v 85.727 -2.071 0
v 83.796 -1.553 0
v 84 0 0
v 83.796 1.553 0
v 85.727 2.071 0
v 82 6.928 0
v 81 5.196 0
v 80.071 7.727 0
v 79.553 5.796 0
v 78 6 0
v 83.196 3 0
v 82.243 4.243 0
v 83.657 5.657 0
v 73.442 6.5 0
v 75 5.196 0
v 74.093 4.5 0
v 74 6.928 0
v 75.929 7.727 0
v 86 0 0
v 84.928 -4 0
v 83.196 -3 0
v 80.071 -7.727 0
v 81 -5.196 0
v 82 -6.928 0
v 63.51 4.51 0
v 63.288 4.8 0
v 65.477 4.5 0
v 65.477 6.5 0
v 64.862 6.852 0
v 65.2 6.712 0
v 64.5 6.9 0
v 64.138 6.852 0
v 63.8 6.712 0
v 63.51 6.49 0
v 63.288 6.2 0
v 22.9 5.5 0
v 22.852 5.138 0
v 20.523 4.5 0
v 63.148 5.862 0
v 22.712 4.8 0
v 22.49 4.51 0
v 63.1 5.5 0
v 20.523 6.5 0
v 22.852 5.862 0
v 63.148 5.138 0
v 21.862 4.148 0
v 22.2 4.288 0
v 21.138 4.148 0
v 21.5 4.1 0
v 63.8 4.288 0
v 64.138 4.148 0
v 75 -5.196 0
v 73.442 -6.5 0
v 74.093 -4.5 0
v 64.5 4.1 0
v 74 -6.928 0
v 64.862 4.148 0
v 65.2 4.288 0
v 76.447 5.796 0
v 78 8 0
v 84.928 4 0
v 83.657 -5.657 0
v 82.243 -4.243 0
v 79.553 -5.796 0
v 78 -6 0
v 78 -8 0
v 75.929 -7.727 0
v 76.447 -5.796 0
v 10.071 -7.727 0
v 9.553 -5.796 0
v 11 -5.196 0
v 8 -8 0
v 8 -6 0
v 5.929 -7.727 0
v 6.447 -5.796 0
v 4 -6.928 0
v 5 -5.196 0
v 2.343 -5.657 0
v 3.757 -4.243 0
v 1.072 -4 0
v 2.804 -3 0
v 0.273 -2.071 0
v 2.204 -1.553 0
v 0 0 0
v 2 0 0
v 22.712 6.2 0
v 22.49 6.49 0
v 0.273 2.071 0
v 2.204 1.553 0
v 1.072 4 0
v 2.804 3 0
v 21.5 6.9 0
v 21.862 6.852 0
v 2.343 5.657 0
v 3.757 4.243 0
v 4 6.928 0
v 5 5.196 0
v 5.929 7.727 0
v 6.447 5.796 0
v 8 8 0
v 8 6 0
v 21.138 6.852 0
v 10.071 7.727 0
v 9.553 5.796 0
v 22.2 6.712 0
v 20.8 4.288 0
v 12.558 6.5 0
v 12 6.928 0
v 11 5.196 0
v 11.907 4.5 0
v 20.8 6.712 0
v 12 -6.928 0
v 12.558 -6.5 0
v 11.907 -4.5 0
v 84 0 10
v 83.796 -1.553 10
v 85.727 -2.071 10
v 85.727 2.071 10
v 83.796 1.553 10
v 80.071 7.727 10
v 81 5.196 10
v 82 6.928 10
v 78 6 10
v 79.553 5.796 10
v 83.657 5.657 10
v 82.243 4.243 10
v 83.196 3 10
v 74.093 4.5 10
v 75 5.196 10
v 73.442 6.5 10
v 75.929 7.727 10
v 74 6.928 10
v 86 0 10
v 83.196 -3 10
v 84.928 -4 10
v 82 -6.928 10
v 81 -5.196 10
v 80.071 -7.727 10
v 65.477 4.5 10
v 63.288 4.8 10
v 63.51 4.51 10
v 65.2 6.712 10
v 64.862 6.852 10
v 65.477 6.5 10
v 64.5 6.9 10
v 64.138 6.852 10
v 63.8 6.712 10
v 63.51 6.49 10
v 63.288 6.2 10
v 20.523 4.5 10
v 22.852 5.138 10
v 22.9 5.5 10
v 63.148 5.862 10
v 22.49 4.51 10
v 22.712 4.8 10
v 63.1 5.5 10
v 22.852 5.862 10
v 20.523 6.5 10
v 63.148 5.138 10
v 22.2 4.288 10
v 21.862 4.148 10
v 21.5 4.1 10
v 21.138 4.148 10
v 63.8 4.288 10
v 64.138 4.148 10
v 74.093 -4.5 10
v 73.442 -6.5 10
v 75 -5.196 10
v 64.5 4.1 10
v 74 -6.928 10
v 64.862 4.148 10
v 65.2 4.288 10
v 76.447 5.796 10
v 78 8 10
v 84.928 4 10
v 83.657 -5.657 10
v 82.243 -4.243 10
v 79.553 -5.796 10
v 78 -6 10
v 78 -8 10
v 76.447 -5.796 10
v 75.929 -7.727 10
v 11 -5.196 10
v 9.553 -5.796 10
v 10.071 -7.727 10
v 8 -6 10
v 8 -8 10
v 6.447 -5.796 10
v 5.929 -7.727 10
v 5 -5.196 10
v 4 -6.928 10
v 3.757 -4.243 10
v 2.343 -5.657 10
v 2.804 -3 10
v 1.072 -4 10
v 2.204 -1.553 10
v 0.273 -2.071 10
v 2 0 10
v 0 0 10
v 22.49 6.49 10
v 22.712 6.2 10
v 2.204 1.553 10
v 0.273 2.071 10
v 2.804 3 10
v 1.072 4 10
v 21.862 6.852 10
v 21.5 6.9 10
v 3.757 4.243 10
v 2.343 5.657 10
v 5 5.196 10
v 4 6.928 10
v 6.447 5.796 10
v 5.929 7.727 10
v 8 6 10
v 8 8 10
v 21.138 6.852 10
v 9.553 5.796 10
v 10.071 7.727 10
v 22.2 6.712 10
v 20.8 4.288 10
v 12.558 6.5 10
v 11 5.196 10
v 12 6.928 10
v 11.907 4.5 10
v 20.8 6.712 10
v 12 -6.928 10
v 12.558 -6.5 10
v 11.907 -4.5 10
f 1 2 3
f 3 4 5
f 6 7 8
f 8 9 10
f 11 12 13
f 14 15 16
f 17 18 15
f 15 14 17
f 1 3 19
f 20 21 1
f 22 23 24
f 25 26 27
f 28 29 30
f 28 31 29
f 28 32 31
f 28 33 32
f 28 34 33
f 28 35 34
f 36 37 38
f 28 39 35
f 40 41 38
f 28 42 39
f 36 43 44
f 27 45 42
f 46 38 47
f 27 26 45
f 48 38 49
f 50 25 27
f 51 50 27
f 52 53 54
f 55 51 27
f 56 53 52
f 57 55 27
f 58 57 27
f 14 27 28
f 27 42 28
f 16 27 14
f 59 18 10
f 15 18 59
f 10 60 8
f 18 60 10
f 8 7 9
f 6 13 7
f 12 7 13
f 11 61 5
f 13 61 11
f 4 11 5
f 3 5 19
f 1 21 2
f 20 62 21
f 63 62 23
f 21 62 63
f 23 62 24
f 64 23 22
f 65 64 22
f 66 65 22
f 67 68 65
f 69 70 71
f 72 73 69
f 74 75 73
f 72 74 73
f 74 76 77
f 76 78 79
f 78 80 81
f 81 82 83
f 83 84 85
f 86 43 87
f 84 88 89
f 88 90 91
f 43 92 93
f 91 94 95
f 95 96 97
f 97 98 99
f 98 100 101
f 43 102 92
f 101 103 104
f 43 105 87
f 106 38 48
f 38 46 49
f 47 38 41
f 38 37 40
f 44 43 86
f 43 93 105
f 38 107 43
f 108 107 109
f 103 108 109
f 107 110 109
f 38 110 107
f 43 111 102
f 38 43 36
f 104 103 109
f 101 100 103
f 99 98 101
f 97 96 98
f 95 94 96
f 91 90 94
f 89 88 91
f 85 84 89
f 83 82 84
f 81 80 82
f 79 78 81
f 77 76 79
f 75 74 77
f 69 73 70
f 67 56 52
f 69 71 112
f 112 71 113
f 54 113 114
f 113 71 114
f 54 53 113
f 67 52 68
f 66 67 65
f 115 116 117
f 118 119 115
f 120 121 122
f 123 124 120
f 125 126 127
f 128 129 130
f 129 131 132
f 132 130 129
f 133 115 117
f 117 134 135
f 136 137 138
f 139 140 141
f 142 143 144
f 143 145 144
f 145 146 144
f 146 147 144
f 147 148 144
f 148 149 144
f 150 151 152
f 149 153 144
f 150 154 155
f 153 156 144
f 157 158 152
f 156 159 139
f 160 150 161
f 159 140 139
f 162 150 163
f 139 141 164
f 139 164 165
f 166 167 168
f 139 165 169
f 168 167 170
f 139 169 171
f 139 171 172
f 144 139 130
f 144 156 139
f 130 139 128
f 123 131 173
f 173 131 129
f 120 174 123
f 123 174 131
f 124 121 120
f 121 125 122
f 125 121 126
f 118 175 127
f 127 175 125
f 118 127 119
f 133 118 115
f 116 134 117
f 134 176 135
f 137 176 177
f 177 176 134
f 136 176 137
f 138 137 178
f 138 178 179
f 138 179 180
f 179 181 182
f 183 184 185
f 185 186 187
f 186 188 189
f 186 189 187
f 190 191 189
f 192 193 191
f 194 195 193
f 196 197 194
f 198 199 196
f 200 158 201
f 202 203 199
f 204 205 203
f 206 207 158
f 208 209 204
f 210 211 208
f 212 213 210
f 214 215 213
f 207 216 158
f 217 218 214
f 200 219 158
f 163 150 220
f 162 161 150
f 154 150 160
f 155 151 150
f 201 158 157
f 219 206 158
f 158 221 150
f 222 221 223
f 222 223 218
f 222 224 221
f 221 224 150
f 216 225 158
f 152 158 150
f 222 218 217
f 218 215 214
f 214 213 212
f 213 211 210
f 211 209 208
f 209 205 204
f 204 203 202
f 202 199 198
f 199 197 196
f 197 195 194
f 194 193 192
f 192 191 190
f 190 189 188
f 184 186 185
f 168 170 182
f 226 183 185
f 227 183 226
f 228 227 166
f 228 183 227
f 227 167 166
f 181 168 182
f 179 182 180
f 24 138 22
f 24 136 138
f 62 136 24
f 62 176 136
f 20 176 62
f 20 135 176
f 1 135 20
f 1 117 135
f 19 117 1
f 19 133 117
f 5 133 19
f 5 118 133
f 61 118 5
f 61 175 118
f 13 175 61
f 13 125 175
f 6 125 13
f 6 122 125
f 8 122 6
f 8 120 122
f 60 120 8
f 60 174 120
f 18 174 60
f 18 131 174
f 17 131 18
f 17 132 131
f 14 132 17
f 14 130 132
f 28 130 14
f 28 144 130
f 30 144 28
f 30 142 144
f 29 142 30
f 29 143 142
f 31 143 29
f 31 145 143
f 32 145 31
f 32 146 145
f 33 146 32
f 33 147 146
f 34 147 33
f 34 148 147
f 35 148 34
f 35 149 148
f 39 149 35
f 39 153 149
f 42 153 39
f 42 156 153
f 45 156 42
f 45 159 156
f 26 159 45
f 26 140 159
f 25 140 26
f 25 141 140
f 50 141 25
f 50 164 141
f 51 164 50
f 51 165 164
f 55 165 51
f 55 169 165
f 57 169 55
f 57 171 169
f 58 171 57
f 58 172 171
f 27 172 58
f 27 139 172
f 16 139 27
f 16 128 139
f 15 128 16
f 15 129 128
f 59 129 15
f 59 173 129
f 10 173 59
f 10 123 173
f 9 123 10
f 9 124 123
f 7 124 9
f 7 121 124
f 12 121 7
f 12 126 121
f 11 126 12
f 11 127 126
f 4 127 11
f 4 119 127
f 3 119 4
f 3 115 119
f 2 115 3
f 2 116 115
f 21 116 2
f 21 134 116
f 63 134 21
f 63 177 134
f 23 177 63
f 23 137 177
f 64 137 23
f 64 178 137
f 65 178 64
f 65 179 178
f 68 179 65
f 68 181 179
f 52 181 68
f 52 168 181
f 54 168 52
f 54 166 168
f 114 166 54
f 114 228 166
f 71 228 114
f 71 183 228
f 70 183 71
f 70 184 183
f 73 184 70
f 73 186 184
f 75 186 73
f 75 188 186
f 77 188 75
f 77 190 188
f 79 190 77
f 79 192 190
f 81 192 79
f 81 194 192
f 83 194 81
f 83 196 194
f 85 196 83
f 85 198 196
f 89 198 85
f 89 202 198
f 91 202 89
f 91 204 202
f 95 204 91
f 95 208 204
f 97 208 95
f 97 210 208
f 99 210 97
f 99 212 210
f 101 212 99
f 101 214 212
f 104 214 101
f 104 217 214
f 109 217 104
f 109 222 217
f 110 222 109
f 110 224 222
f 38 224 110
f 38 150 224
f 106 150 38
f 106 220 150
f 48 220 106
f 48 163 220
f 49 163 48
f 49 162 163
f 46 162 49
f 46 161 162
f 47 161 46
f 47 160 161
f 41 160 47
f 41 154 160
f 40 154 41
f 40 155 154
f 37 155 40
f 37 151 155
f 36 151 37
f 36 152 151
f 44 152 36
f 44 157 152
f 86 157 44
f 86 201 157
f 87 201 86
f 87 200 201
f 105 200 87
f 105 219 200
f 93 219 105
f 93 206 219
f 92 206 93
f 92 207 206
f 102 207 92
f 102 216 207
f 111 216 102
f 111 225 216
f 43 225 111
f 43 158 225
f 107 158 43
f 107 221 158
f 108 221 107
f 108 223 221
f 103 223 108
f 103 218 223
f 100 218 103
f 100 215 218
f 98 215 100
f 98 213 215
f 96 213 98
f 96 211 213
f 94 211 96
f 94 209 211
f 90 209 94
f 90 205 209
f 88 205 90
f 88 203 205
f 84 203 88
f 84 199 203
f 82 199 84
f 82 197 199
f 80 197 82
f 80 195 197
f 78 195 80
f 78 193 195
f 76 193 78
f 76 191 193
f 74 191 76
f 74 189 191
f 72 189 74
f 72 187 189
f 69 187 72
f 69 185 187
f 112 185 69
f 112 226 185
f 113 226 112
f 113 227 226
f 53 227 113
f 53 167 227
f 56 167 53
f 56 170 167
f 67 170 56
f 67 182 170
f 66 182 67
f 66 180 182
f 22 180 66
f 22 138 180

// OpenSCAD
// mathgrrl customizable sock bone

////////////////////////////////////////////////////////////////////////////
// parameters //////////////////////////////////////////////////////////////

// Length from one side of the sock to the other
length = 86; 

// Width/thickness of the folded sock
width = 13; 

// parameters that the user does not get to specify
$fn = 24*1;
radius = width*(8/13);
thickness = 2*1; 
height = 10*1; 

////////////////////////////////////////////////////////////////////////////
// renders /////////////////////////////////////////////////////////////////

sockbone();

////////////////////////////////////////////////////////////////////////////
// module for clip /////////////////////////////////////////////////////////

module sockbone(){
	linear_extrude(height)
	// 2D shape of bone holder
	union(){
		difference(){
			// outer bone
			union(){
				translate([radius,0,0]) 
					circle(radius);
				translate([radius,-width/2,0]) 
					square([length-2*radius,width]);
				translate([length-radius,0,0]) 
					circle(radius);
			};
			// take away inner bone
			union(){
				translate([radius,0,0]) 
					circle(radius-thickness);
				translate([radius,-(width-2*thickness)/2,0]) 
					square([length-2*radius,width-2*thickness]);
				translate([length-radius,0,0])
					circle(radius-thickness);
			}
			// take away opening
			translate([.25*length,0,0]) 
				square(.5*length);
		}
		// rounded end caps
		translate([.25*length,width/2-thickness/2,0])
			circle(.7*thickness);
		translate([.75*length,width/2-thickness/2,0])
			circle(.7*thickness);
	}
}
